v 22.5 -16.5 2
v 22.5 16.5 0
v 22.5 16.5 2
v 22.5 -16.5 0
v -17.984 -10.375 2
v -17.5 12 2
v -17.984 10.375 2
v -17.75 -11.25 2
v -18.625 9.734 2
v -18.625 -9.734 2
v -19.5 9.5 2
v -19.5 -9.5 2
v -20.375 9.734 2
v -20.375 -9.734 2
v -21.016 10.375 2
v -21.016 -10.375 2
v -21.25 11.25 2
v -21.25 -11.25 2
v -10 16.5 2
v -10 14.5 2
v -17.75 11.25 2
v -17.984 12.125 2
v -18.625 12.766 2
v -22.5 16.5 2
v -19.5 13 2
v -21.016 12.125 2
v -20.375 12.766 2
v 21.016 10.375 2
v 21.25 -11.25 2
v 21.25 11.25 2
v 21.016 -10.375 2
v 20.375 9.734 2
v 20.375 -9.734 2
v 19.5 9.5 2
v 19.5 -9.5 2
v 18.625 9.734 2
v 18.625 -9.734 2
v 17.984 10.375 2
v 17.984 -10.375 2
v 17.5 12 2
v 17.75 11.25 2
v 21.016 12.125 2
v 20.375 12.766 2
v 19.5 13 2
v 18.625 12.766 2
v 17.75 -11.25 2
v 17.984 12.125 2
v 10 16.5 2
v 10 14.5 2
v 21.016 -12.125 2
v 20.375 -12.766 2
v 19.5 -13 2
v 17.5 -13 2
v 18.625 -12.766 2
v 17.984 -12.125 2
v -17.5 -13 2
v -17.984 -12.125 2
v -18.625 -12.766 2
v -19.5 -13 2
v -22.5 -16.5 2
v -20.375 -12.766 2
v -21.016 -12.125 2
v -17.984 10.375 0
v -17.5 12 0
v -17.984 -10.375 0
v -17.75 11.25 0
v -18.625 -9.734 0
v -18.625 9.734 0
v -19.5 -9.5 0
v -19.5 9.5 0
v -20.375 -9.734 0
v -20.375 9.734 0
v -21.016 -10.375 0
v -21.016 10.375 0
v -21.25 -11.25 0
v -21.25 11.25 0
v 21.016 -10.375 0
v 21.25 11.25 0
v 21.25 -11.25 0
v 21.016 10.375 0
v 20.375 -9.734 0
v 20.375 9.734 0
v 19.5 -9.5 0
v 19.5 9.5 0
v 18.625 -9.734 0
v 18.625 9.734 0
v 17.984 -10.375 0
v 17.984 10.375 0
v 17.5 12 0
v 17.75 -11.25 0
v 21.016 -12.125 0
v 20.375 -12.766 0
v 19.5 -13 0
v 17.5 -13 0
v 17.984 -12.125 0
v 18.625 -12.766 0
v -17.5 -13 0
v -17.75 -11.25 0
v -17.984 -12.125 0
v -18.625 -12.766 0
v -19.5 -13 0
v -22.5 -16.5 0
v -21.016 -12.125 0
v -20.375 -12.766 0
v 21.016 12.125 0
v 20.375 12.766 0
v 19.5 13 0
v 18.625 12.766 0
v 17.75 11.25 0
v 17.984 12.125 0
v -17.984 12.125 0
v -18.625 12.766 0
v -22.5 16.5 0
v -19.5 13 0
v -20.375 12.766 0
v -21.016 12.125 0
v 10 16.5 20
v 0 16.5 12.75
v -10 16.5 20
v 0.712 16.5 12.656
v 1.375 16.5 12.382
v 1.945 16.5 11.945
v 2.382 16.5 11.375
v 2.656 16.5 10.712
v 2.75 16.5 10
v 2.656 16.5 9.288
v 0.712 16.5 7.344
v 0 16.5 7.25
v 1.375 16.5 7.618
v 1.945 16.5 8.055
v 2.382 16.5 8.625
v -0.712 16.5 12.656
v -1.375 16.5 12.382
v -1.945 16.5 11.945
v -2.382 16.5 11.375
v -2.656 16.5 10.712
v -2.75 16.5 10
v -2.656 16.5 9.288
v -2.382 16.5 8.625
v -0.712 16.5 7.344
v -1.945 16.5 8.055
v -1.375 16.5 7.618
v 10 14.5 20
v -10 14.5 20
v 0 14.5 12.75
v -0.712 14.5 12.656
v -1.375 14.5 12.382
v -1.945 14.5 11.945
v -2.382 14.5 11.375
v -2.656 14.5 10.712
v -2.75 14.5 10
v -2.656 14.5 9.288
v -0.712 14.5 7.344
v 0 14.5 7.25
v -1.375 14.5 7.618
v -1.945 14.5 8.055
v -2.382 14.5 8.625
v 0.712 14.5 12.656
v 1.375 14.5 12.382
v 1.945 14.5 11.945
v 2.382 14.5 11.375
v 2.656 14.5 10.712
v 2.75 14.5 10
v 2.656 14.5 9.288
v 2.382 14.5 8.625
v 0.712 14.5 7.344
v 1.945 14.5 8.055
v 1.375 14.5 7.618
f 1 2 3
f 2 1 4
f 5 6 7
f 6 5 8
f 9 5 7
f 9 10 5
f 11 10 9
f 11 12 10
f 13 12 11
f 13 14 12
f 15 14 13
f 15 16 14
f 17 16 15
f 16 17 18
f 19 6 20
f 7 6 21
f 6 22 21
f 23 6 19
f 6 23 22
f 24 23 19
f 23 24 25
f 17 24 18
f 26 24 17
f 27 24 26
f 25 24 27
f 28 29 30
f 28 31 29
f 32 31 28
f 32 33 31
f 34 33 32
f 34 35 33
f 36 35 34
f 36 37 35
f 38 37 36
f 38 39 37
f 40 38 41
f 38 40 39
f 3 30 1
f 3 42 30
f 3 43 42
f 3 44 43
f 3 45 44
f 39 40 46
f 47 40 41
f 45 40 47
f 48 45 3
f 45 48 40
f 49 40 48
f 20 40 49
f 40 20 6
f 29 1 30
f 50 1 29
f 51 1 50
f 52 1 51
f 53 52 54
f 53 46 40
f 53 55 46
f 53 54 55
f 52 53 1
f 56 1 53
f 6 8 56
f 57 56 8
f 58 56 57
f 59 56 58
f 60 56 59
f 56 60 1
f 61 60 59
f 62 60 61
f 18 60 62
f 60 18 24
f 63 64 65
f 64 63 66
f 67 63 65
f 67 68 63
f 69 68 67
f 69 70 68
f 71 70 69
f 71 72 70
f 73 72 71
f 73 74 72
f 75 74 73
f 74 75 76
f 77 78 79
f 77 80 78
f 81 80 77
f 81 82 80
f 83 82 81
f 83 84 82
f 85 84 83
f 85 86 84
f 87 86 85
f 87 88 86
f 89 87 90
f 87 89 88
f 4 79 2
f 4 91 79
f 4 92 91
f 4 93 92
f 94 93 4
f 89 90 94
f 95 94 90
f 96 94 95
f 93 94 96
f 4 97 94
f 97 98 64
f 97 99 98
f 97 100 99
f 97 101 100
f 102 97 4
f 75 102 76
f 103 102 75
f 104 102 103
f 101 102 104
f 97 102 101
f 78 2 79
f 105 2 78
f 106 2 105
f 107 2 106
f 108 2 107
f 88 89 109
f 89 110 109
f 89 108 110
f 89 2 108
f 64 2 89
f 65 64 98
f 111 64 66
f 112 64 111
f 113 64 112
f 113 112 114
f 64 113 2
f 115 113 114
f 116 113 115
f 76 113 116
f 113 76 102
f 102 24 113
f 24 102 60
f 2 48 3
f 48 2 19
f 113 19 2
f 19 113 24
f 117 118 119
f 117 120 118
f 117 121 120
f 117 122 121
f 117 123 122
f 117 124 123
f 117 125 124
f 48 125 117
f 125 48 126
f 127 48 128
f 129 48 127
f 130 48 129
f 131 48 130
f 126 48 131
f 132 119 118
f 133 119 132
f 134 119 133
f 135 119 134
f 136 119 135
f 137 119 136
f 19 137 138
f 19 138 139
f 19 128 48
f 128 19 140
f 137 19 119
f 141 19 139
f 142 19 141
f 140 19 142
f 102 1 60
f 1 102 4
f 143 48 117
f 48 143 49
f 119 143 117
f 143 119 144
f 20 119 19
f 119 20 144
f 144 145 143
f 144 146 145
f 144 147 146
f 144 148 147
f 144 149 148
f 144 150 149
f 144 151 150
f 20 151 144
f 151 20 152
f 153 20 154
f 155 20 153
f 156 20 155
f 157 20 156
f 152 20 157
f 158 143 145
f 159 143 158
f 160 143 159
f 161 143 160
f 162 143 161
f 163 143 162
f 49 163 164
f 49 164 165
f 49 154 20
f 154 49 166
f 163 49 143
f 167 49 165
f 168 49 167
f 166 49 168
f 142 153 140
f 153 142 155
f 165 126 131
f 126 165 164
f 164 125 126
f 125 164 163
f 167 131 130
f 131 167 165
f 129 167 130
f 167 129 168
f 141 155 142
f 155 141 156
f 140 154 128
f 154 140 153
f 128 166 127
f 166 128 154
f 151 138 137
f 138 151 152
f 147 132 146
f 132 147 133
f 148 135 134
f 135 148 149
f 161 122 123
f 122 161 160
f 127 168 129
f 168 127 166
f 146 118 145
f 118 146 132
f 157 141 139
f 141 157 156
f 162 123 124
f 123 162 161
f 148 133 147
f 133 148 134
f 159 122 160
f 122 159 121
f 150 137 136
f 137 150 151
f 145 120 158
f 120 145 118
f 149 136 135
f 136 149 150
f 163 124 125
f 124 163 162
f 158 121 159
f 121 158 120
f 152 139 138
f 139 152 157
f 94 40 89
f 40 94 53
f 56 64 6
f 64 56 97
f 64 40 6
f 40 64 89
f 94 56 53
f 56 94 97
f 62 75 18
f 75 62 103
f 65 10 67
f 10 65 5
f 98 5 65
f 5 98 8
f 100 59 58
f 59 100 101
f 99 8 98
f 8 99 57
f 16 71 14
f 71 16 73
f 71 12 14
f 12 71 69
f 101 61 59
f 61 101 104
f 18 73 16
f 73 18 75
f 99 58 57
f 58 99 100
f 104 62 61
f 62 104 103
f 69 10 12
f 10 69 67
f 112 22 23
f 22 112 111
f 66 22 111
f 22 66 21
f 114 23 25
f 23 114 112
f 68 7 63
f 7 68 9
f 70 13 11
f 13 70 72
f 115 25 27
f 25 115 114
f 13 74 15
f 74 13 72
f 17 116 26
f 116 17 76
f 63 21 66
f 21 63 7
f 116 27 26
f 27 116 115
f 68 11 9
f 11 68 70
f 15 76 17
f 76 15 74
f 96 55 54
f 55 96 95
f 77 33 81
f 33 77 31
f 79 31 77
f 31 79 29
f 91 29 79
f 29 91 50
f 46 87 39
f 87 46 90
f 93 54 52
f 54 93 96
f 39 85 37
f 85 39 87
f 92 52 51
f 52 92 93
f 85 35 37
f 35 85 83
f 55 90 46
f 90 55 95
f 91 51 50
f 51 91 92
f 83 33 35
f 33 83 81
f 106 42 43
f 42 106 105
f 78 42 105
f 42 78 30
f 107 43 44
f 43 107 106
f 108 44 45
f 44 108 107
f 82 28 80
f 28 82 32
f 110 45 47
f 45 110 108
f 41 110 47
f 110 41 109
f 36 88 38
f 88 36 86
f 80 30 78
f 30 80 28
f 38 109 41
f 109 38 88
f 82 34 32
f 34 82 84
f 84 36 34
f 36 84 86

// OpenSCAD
//39   45
//22.5 29


difference()
{
    union()
    {
        translate([-45/2,-33/2,0])
            cube([45,33,2]);
        
        translate([-10,29/2,0])
            cube([20,2,20]);
    }
    union()
    {
        translate([0,29/2,10])
            rotate([270,0,0])
                cylinder(d=5.5,h=2,$fn=24);
        
        translate([-35/2,-26/2,0])
            cube([35,25,2]);
        
        translate([-39/2,-22.5/2,0])
            cylinder(d=3.5,h=2,$fn=12);
        translate([-39/2,22.5/2,0])
            cylinder(d=3.5,h=2,$fn=12);
        translate([39/2,-22.5/2,0])
            cylinder(d=3.5,h=2,$fn=12);
        translate([39/2,22.5/2,0])
            cylinder(d=3.5,h=2,$fn=12);
    }
}
